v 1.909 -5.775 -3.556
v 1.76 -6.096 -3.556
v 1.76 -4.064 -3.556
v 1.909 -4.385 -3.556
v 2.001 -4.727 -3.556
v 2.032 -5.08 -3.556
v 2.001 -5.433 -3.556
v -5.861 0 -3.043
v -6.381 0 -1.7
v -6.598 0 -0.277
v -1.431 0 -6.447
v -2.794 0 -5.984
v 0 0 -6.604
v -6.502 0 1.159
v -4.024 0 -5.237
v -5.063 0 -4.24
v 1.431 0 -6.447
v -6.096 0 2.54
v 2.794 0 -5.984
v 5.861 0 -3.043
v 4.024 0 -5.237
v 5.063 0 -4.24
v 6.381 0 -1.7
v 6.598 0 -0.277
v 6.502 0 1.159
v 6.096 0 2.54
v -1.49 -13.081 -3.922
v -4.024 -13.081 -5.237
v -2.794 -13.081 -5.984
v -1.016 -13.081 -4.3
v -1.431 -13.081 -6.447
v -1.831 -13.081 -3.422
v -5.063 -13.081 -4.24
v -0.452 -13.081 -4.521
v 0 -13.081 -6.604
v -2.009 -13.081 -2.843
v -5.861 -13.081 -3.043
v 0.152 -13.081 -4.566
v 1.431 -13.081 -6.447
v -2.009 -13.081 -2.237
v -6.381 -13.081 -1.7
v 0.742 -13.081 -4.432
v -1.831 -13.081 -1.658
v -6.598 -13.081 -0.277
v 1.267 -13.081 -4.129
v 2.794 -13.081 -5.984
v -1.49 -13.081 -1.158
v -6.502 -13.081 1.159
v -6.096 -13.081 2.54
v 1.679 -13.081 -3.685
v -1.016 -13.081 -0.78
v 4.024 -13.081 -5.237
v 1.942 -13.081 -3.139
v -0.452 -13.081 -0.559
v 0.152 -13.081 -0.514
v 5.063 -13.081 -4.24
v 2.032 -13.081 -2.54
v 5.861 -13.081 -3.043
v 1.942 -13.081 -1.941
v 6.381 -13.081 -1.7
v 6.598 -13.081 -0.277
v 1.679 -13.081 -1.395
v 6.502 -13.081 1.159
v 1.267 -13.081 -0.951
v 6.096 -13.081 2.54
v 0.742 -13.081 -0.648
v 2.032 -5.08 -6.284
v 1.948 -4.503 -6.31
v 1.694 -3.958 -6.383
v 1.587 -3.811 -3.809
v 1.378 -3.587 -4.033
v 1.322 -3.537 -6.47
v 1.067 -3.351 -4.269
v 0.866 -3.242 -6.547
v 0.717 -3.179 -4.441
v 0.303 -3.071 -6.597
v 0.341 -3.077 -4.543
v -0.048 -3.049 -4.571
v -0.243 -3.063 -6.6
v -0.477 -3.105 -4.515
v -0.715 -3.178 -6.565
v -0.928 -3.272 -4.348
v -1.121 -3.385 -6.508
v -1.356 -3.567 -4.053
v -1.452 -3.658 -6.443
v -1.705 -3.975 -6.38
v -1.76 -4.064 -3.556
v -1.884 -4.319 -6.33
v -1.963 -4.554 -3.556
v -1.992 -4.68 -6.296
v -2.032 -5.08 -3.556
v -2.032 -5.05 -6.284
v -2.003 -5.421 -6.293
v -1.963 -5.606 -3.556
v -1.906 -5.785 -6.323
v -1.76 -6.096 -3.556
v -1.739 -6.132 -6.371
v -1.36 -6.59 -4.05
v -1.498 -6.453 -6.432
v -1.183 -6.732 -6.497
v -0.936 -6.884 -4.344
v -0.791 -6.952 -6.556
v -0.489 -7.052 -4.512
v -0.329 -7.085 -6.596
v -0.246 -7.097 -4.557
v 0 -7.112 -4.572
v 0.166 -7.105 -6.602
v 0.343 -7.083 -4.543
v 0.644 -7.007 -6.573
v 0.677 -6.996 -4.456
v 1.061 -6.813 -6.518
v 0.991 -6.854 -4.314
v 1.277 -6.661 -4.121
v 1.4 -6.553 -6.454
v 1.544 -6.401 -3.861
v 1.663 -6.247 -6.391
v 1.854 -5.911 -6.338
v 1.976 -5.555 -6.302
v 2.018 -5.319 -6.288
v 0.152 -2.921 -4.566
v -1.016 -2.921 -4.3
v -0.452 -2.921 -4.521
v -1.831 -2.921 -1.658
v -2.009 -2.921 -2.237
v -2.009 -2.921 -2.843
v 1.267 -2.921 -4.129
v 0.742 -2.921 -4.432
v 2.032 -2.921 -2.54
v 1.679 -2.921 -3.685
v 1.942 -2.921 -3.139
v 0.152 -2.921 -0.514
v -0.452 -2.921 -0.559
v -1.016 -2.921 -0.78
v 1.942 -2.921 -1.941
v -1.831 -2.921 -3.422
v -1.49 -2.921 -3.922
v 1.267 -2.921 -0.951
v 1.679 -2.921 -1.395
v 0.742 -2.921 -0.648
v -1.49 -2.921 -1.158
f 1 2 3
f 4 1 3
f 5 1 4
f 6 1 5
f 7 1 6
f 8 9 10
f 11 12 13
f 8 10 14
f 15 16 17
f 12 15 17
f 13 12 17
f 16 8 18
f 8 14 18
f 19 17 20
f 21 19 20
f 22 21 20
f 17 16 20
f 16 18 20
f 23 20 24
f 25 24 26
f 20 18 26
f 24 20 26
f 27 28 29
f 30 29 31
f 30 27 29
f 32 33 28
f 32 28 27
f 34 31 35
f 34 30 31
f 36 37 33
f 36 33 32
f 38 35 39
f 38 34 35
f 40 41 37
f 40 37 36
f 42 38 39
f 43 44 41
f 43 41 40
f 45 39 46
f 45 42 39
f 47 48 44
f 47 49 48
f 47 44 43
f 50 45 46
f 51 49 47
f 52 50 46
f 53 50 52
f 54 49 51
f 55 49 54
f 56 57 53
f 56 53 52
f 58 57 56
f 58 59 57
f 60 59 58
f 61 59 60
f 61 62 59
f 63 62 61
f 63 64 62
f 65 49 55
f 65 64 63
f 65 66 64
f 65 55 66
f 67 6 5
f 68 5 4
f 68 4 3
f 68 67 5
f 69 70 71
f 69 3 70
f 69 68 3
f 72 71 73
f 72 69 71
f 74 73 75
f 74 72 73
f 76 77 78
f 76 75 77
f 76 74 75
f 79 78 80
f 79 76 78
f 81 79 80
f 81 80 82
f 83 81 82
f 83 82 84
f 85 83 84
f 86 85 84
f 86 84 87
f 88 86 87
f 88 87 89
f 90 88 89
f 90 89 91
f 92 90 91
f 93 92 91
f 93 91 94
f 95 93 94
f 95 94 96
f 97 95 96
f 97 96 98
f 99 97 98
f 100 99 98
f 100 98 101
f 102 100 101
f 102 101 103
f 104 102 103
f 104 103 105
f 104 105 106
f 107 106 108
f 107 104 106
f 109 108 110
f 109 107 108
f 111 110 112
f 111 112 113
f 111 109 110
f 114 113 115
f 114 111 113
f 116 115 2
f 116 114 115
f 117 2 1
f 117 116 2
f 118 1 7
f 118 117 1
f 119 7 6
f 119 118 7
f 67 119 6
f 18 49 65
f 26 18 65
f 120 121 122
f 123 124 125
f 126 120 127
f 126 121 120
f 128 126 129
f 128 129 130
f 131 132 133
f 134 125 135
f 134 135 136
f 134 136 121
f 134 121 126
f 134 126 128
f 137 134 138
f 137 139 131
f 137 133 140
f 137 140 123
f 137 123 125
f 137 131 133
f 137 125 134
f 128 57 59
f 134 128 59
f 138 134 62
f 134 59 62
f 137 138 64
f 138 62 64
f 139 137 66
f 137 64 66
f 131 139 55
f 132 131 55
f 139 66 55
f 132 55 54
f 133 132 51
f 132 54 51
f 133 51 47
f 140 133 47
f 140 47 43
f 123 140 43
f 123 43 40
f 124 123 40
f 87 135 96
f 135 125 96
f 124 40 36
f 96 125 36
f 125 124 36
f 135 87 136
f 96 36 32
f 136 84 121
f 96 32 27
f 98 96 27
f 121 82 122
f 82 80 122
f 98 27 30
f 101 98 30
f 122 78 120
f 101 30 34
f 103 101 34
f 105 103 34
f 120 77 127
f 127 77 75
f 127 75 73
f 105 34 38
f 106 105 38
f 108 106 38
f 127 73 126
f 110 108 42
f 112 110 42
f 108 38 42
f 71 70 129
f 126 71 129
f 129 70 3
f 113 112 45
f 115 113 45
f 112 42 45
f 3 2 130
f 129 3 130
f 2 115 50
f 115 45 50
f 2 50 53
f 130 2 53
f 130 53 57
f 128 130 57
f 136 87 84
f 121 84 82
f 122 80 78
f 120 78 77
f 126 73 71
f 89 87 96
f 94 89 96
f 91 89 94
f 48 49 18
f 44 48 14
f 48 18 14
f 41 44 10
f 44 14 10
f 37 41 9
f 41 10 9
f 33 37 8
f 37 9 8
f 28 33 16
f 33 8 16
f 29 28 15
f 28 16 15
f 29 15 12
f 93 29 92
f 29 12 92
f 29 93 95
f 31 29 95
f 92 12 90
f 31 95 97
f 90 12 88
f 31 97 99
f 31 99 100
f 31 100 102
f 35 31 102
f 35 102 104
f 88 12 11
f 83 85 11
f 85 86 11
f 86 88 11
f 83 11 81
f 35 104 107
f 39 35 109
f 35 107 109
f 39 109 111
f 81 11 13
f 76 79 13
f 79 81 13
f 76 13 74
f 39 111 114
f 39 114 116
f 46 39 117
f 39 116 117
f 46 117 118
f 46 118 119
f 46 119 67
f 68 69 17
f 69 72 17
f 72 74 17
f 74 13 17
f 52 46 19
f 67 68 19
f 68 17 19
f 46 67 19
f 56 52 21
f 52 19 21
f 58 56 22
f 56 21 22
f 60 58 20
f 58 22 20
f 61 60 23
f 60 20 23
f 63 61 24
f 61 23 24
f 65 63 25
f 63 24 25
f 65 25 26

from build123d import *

# Parameters (mm, degrees)
F1_DEPTH = 13.081
F2_R     = 2.032
F3_DEPTH = 10.16
F5_DEPTH = 13.082
F7_R     = 2.032
F8_DEPTH = 3.048


with BuildPart() as f1:
    # F0 (on Front) → F1 (new body)
    with BuildSketch(Plane.XZ):
        with BuildLine():
            ThreePointArc((6.604, 0), (0, 6.604), (-6.604, 0))
            Line((-6.604, 0), (6.604, 0))
        make_face()
        with BuildLine():
            Line((6.604, 0), (-6.604, 0))
            ThreePointArc((-6.604, 0), (0, -6.604), (6.604, 0))
        make_face()
    extrude(amount=F1_DEPTH)

    # F2 (on face) → F3 (cut)
    with BuildSketch(Plane.XZ.offset(13.081)):
        with Locations((0, -2.54)):
            Circle(F2_R)
    extrude(amount=-F3_DEPTH, mode=Mode.SUBTRACT)

    # F4 (on face) → F5 (cut, through all)
    with BuildSketch(Plane.XZ.offset(13.081)):
        with BuildLine():
            ThreePointArc((6.096, 2.54), (0, 6.604), (-6.096, 2.54))
            Line((-6.096, 2.54), (6.096, 2.54))
        make_face()
    extrude(amount=-F5_DEPTH, mode=Mode.SUBTRACT)

    # F7 (on offset) → F8 (cut)
    with BuildSketch(Plane.XY.offset(-6.604)):
        with Locations((0, -5.08)):
            Circle(F7_R)
    extrude(amount=F8_DEPTH, mode=Mode.SUBTRACT)


solid = f1.part
